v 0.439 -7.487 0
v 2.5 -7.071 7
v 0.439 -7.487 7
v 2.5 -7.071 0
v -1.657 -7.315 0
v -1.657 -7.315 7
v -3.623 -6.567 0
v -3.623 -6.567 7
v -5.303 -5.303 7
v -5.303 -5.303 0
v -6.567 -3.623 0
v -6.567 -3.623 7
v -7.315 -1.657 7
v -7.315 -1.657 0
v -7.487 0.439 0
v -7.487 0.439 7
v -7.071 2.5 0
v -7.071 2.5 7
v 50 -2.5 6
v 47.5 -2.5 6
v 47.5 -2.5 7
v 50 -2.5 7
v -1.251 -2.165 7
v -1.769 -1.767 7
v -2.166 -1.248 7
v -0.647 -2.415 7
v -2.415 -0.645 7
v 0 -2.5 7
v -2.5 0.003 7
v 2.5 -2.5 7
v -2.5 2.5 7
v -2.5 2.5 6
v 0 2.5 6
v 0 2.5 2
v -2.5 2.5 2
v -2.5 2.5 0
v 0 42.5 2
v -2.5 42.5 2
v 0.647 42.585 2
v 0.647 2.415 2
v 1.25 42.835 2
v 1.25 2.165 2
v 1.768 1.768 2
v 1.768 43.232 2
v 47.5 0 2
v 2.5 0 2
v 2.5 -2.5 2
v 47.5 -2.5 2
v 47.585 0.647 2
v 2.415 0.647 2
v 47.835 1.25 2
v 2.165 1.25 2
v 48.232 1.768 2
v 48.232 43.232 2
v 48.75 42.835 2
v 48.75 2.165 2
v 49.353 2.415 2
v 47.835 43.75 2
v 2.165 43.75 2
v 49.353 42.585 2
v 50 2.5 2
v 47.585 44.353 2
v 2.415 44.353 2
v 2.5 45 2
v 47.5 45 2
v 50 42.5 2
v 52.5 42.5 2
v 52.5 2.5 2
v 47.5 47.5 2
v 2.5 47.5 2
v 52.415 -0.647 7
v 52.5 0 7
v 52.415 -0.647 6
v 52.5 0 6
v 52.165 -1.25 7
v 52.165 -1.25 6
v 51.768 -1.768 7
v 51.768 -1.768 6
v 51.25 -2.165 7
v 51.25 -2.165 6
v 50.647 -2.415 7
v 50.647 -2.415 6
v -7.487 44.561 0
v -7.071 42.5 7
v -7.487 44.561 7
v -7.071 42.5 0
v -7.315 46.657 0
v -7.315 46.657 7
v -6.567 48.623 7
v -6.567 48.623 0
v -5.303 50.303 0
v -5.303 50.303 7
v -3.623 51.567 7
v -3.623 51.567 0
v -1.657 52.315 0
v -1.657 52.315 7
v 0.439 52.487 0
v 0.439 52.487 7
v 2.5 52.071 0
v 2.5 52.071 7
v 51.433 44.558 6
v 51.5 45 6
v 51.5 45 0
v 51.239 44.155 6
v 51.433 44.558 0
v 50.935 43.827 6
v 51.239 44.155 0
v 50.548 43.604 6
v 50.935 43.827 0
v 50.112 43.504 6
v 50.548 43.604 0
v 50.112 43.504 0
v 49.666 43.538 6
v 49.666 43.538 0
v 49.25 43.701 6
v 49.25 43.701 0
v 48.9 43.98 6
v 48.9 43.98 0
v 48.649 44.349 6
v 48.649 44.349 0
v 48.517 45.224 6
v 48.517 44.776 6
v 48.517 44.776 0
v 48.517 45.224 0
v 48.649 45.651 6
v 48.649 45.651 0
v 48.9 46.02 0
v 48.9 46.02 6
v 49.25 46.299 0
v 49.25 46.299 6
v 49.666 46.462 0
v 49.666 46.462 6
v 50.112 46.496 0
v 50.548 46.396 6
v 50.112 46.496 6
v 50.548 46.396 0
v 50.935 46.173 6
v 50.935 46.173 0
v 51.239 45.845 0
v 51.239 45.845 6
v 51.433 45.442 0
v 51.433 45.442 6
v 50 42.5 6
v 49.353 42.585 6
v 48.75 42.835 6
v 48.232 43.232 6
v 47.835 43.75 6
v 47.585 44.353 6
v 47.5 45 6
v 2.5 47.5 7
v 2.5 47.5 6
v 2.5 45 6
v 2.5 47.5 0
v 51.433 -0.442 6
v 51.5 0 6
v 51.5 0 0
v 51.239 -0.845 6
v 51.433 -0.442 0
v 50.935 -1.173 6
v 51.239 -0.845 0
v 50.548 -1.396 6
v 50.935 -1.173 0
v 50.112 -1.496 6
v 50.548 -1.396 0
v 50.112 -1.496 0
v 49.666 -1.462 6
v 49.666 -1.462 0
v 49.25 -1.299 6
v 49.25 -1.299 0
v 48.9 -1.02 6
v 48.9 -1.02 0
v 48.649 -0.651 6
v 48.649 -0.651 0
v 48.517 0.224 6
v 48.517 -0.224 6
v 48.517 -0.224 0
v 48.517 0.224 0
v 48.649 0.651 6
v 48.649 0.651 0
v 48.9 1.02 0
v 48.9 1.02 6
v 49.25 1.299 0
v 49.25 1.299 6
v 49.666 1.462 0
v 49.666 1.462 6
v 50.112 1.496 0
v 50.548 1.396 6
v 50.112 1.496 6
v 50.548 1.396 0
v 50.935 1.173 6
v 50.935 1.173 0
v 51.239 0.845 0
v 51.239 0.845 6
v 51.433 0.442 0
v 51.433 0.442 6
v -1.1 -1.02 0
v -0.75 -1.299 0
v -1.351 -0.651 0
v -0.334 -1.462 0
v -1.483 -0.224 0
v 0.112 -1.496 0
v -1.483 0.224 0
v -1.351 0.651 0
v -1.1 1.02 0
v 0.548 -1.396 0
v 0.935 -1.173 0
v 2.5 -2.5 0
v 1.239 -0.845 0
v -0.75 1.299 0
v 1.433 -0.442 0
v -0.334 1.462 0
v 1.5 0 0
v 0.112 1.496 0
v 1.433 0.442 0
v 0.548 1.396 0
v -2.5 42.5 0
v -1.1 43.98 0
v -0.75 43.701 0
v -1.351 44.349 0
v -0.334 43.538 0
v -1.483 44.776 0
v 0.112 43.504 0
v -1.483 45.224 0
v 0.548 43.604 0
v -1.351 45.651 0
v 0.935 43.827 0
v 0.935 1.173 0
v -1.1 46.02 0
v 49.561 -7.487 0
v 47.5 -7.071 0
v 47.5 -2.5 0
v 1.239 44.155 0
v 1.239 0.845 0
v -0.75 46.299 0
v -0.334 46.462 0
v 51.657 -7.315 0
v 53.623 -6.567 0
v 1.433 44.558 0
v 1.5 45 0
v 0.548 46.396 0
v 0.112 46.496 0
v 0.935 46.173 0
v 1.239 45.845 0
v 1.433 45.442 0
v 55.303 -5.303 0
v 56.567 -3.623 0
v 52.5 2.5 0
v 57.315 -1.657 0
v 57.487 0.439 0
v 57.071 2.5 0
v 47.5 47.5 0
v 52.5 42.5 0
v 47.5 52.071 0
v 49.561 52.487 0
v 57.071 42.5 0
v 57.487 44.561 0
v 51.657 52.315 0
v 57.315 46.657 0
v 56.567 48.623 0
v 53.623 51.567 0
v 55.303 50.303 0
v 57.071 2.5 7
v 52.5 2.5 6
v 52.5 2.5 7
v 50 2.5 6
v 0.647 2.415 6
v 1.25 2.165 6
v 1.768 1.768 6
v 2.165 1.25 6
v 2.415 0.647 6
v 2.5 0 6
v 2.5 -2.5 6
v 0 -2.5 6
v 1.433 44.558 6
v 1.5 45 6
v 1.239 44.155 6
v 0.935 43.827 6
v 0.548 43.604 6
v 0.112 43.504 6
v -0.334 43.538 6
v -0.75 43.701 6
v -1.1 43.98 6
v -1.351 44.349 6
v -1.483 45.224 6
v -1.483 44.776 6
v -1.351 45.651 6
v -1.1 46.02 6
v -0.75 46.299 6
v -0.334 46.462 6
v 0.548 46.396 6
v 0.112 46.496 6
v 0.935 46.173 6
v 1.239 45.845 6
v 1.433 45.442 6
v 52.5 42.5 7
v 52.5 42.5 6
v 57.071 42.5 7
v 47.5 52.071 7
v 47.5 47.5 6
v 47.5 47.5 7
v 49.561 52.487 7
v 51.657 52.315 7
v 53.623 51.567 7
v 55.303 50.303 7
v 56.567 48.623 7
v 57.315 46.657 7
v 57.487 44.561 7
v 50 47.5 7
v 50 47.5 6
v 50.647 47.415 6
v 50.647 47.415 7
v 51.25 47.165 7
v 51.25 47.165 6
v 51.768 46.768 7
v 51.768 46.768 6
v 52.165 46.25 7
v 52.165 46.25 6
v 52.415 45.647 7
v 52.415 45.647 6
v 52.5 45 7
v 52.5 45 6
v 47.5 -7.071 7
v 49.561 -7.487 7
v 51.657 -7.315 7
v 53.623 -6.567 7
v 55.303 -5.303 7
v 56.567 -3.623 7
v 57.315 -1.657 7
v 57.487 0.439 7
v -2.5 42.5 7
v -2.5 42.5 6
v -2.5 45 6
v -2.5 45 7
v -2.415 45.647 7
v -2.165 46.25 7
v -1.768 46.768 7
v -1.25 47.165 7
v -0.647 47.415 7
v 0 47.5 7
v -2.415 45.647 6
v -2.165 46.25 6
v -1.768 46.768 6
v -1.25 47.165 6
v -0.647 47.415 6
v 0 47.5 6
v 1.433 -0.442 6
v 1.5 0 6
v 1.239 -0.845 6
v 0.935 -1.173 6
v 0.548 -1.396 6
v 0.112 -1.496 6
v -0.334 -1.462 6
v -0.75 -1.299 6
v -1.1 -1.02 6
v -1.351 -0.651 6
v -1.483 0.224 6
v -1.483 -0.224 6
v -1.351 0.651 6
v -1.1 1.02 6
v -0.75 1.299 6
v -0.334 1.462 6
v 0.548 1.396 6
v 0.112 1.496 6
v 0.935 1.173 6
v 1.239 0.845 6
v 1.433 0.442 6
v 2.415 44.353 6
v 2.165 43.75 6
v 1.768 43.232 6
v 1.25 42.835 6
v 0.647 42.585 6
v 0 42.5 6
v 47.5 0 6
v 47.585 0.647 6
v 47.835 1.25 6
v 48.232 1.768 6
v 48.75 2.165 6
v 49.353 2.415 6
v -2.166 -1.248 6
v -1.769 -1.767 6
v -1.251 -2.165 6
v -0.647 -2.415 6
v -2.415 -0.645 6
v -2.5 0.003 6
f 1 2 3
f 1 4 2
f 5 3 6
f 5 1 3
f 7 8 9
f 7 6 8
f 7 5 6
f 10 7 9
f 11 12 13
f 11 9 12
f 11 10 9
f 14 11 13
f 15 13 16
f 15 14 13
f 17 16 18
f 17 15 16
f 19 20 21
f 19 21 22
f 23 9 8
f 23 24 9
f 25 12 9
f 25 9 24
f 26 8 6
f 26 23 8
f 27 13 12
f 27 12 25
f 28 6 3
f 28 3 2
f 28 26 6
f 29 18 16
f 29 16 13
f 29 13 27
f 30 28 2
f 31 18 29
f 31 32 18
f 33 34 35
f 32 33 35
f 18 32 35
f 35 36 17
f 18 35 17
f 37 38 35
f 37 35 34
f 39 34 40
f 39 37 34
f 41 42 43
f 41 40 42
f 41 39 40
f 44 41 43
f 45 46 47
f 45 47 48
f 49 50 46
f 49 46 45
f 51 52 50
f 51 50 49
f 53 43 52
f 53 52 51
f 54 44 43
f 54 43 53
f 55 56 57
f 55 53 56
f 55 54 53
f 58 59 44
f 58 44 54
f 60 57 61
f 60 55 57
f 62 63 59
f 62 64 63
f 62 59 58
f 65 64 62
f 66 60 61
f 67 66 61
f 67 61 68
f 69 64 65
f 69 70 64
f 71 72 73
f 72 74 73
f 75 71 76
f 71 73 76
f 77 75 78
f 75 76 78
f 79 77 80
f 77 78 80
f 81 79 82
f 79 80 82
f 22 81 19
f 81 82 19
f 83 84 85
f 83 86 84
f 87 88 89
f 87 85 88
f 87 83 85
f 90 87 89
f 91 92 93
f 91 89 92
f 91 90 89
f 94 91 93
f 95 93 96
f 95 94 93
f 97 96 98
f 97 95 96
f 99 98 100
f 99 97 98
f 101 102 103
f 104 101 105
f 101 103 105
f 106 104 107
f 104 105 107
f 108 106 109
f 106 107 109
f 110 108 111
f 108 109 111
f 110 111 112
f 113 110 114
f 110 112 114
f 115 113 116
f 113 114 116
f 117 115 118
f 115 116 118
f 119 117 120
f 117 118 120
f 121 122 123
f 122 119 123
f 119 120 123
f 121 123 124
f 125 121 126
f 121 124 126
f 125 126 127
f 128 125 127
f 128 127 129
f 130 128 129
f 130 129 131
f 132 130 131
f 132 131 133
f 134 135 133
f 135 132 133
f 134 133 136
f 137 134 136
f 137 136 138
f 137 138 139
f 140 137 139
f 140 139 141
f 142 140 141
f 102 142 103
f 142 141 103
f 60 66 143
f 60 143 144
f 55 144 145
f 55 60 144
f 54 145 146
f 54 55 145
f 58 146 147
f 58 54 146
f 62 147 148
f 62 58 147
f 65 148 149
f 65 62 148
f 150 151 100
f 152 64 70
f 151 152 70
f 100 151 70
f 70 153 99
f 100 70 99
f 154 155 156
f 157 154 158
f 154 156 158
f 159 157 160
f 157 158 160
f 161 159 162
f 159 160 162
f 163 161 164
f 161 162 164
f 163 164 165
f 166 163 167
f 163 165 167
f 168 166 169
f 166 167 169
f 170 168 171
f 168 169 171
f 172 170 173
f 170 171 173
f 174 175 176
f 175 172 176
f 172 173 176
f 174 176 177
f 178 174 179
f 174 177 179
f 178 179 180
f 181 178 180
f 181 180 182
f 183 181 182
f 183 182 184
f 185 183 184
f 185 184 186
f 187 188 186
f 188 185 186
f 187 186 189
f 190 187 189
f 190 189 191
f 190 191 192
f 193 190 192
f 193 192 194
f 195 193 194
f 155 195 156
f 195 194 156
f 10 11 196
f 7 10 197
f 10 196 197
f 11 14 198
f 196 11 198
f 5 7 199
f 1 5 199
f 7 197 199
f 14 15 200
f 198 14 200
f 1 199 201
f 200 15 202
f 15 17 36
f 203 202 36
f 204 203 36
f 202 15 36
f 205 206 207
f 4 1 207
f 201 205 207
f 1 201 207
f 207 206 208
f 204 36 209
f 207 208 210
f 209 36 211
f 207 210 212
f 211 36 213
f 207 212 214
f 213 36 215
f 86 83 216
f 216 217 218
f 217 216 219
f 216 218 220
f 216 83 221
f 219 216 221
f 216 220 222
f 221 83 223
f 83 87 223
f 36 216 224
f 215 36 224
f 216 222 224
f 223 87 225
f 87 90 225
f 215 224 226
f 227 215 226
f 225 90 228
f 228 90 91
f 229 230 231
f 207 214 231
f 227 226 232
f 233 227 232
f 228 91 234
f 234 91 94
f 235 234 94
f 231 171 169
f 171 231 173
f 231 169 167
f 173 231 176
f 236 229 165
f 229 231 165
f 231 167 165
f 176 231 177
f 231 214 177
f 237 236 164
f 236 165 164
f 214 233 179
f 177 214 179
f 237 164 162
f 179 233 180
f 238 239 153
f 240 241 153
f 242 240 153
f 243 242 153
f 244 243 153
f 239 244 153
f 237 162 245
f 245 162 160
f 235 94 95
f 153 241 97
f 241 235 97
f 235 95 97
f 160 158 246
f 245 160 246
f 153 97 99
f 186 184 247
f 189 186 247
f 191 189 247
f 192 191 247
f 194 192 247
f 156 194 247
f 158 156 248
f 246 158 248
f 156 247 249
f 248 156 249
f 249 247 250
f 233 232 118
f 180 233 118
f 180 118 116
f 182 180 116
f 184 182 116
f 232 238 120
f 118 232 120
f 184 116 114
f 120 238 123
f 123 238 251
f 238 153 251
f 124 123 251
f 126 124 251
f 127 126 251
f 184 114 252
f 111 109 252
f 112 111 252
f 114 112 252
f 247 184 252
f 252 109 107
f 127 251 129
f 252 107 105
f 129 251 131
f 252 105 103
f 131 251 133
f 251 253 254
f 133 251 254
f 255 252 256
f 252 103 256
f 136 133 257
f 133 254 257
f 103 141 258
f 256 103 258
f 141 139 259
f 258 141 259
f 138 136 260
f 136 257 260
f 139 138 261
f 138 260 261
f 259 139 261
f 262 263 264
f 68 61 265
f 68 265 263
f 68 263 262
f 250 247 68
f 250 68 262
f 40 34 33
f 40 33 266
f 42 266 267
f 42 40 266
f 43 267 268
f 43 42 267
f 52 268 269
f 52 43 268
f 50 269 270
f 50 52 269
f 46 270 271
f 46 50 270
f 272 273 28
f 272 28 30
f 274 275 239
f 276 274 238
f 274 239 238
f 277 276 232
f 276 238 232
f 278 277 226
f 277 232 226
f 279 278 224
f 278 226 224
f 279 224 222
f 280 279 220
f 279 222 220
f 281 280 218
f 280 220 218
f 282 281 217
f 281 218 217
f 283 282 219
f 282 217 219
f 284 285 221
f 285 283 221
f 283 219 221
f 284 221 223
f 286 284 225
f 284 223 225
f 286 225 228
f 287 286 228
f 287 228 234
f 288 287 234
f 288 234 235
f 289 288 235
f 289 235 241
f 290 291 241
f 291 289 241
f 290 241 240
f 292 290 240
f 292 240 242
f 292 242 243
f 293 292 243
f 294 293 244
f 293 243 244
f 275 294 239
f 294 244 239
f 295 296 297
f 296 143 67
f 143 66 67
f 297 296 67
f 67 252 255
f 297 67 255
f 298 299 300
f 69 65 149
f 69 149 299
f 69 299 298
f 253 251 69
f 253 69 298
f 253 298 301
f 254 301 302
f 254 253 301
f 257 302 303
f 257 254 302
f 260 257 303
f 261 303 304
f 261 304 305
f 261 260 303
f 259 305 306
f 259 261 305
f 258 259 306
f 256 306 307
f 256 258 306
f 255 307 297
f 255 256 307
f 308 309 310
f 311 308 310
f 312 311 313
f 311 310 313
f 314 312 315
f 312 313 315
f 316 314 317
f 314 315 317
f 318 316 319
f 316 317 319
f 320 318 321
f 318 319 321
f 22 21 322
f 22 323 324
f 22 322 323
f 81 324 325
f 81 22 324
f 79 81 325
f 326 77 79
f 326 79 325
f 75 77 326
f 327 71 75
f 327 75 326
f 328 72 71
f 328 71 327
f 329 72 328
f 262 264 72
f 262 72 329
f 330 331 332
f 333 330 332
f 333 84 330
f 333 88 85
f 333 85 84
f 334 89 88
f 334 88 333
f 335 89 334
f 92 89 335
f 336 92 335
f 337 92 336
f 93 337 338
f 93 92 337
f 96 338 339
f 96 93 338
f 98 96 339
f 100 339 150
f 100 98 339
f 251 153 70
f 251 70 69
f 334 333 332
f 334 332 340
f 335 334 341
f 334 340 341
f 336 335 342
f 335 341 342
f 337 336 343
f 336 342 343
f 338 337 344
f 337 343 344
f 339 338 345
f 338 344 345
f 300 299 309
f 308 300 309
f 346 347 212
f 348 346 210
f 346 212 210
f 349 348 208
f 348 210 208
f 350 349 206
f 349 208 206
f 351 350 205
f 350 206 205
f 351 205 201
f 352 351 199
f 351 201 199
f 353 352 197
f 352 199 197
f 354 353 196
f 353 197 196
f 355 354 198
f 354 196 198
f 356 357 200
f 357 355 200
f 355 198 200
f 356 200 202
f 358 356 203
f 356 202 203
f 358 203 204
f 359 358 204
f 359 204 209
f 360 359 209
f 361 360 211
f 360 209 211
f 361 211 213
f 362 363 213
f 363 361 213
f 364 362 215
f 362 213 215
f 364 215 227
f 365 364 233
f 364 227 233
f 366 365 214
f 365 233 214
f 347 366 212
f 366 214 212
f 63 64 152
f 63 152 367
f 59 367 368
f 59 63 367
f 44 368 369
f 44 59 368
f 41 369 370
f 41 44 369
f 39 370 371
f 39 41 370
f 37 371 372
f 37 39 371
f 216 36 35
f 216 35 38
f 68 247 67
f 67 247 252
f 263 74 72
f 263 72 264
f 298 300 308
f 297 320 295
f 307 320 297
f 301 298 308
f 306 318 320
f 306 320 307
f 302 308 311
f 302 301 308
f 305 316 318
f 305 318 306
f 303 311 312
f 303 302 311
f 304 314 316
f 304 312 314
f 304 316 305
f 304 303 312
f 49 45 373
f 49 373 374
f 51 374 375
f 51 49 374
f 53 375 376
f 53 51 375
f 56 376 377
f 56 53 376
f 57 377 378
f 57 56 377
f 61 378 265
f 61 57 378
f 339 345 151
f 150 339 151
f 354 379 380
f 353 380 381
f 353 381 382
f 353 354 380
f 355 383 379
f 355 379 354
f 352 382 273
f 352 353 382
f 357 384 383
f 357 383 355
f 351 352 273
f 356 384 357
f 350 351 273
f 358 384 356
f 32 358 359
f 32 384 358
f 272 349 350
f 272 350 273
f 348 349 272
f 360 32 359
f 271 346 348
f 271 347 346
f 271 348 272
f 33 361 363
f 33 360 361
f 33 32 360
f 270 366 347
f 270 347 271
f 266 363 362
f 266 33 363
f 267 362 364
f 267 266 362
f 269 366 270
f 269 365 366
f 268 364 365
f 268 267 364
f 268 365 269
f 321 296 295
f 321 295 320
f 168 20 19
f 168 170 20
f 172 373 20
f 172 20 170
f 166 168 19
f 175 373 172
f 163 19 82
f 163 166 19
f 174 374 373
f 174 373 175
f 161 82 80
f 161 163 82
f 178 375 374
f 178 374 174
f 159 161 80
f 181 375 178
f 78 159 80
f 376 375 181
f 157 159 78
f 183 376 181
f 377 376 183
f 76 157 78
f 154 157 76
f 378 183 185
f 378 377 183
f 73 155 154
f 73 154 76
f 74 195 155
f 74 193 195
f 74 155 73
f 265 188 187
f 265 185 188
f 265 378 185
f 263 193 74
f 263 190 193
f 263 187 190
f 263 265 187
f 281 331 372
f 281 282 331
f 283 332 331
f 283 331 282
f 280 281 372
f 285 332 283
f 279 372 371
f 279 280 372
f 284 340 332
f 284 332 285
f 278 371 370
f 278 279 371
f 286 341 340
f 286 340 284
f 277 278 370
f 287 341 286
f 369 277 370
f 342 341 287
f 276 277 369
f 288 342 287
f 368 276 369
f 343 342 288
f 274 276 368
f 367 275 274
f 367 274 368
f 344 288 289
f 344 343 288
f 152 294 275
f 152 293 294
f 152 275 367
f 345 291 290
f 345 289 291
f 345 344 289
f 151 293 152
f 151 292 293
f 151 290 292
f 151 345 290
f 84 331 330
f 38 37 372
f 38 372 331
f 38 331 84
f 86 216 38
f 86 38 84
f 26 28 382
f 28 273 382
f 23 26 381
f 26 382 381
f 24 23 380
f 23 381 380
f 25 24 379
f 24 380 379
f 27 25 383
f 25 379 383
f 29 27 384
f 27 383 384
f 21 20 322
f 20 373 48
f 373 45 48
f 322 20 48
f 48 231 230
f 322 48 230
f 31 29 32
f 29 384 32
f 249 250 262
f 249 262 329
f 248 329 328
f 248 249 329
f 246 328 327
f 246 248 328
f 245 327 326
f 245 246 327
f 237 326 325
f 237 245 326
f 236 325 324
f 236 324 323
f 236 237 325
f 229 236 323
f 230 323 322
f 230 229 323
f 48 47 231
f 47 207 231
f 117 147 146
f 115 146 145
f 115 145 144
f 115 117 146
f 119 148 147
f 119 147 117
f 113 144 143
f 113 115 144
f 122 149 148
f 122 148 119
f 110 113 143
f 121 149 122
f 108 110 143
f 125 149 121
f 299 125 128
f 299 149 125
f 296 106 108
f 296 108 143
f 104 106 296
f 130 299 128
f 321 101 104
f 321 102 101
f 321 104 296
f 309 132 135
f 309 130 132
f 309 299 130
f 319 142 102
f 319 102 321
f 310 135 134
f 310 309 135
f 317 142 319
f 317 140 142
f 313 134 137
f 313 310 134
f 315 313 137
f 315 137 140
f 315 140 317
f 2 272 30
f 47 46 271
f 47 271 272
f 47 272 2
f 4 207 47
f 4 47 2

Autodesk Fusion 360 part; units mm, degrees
sketch "Sketch1" plane through (0, 0, 0) normal (0, 0, 1) x (1, 0, 0)
  line L0 (0, 0) -> (60, 0)
  line L1 (60, 0) -> (60, 60)
  line L2 (60, 60) -> (0, 60)
  line L3 (0, 60) -> (0, 0)
  line L4 (2, 2) -> (58, 2)
  line L5 (58, 2) -> (58, 58)
  line L6 (58, 58) -> (2, 58)
  line L7 (2, 58) -> (2, 2)
  dimension "d1" = 60
  dimension "d2" = 60
  dimension "d3" = 56
  dimension "d4" = 56
sketch "Sketch2" plane through (0, 0, 2) normal (0, 0, 1) x (-1, 0, 0)
  line L0 (-2, -2) -> (-4.5, -2)
  line L1 (-4.5, -2) -> (-4.5, -5)
  line L2 (-4.5, -5) -> (-2, -5)
  line L3 (-2, -5) -> (-2, -2)
  line L4 (-2, -58) -> (-4.5, -58)
  line L5 (-4.5, -58) -> (-4.5, -55)
  line L6 (-4.5, -55) -> (-2, -55)
  line L7 (-2, -55) -> (-2, -58)
  line L8 (-58, -58) -> (-49.5, -58)
  line L9 (-49.5, -58) -> (-49.5, -55)
  line L10 (-49.5, -55) -> (-58, -55)
  line L11 (-58, -55) -> (-58, -58)
  line L12 (-58, -2) -> (-49.5, -2)
  line L13 (-49.5, -2) -> (-49.5, -5)
  line L14 (-49.5, -5) -> (-58, -5)
  line L15 (-58, -5) -> (-58, -2)
  circle A0 centre (-4.5, -55) radius 1
  circle A1 centre (-49.5, -55) radius 1
  circle A2 centre (-4.5, -5) radius 1
  circle A3 centre (-49.5, -5) radius 1
  line L16 (-2, -58) -> (-2, -2)
  line L17 (-2, -2) -> (-58, -2)
  line L18 (-58, -2) -> (-58, -58)
  line L19 (-58, -58) -> (-2, -58)
  dimension "d9" = 2.5
  dimension "d10" = 3
  dimension "d11" = 2.5
  dimension "d12" = 3
  dimension "d13" = 8.5
  dimension "d14" = 3
  dimension "d15" = 8.5
  dimension "d16" = 3
  dimension "d17" = 2
  dimension "d18" = 2
  dimension "d19" = 2
  dimension "d20" = 2
sketch "Sketch3" plane through (0, 0, 0) normal (0, 0, 1) x (1, 0, 0)
  circle A0 centre (0, 45) radius 1.5
  circle A1 centre (50, 45) radius 1.5
  circle A2 centre (50, 0) radius 1.5
  circle A3 centre (0, 0) radius 1.5
  line L0 (0, -2.5) -> (50, -2.5)
  line L1 (52.5, 0) -> (52.5, 45)
  line L2 (-2.5, 0.0027) -> (-2.5, 45)
  line L3 (0.0001, 47.5) -> (50, 47.5)
  circle A4 centre (0, 45) radius 7.5
  circle A5 centre (0, 0) radius 7.5
  circle A6 centre (50, 45) radius 7.5
  circle A7 centre (50, 0) radius 7.5
  line L4 (0, 42.5) -> (-7.0711, 42.5)
  line L5 (2.5, 45) -> (2.5, 52.0711)
  line L6 (47.5, 45) -> (47.5, 52.0711)
  line L7 (50, 42.5) -> (57.0711, 42.5)
  line L8 (50, 2.5) -> (57.0711, 2.5)
  line L9 (47.5, 0) -> (47.5, -7.0711)
  line L10 (0, 2.5) -> (-7.0711, 2.5)
  line L11 (2.5, 0) -> (2.5, -7.0711)
  arc A8 (0, 42.5) -> (2.5, 45) centre (0, 45) ccw
  arc A9 (0.0001, 47.5) -> (-2.5, 45) centre (0, 45) ccw
  line L12 (0, 45) -> (0, 43.5)
  line L13 (1.5, 45) -> (0, 45)
  arc A10 (47.5, 45) -> (50, 42.5) centre (50, 45) ccw
  arc A11 (52.5, 45) -> (50, 47.5) centre (50, 45) ccw
  line L14 (50, 43.5) -> (50, 45)
  line L15 (50, 45) -> (48.5, 45)
  line L16 (47.5, 45) -> (2.5, 45)
  arc A12 (50, 2.5) -> (47.5, 0) centre (50, 0) ccw
  arc A13 (50, -2.5) -> (52.5, 0) centre (50, 0) ccw
  line L17 (48.5, 0) -> (50, 0)
  line L18 (50, 0) -> (50, 1.5)
  line L19 (50, 2.5) -> (50, 42.5)
  arc A14 (-2.5, 0.0027) -> (0, -2.5) centre (0, 0) ccw
  arc A15 (2.5, 0) -> (0, 2.5) centre (0, 0) ccw
  line L20 (0, 0) -> (1.5, 0)
  line L21 (2.5, 0) -> (47.5, 0)
  line L22 (0, 42.5) -> (0, 2.5)
  line L23 (0, 1.5) -> (0, 0)
  dimension "d23" = 50
  dimension "d24" = 45
  dimension "d25" = 3
  dimension "d26" = 3
  dimension "d27" = 3
  dimension "d28" = 3
  dimension "d29" = 5
  dimension "d30" = 5
  dimension "d31" = 5
  dimension "d32" = 5
  dimension "d37" = 15
  dimension "d38" = 15
  dimension "d39" = 15
  dimension "d40" = 15
extrude "Extrude6" add sketch "Sketch3" along normal blind 7 contours L0 L2 A5 L10 L11 A14 | L0 L1 A7 L8 L9 A13 | L2 L3 A4 L4 L5 A9 | L1 L3 A6 L6 L7 A11 makes body 1 at (48.1731, 52.2741, 2.3333) makes body 2 at (48.8622, -7.4132, 4.6667) makes body 3 at (-7.4132, 43.8622, 2.3333) makes body 4 at (2.1658, -7.1805, 4.6667)
extrude "Extrude7" add sketch "Sketch3" along normal blind 2 separate body contours L0 A5 L11 L21 | L0 A5 A7 L21 | A5 A15 L21 L22 | L2 A5 L10 L22 | L0 A7 L9 L21 | A4 A5 A6 A7 L16 L19 L21 L22 | L2 A4 A5 L22 | A7 A12 L19 L21 | L2 A4 L4 L22 | L1 A6 A7 L19 | L1 A7 L8 L19 | A4 A8 L16 L22 | L1 A6 L7 L19 | A6 A10 L16 L19 | L3 A4 L5 L16 | L3 A4 A6 L16 | L3 A6 L6 L16 makes body 5
extrude "Extrude8" add sketch "Sketch3" along normal blind 6 contours L0 L2 L10 L11 A14 A15 | L0 L1 L8 L9 A12 A13 | L2 L3 L4 L5 A8 A9 | L1 L3 L6 L7 A10 A11 bodies 1 2 3 4 5
